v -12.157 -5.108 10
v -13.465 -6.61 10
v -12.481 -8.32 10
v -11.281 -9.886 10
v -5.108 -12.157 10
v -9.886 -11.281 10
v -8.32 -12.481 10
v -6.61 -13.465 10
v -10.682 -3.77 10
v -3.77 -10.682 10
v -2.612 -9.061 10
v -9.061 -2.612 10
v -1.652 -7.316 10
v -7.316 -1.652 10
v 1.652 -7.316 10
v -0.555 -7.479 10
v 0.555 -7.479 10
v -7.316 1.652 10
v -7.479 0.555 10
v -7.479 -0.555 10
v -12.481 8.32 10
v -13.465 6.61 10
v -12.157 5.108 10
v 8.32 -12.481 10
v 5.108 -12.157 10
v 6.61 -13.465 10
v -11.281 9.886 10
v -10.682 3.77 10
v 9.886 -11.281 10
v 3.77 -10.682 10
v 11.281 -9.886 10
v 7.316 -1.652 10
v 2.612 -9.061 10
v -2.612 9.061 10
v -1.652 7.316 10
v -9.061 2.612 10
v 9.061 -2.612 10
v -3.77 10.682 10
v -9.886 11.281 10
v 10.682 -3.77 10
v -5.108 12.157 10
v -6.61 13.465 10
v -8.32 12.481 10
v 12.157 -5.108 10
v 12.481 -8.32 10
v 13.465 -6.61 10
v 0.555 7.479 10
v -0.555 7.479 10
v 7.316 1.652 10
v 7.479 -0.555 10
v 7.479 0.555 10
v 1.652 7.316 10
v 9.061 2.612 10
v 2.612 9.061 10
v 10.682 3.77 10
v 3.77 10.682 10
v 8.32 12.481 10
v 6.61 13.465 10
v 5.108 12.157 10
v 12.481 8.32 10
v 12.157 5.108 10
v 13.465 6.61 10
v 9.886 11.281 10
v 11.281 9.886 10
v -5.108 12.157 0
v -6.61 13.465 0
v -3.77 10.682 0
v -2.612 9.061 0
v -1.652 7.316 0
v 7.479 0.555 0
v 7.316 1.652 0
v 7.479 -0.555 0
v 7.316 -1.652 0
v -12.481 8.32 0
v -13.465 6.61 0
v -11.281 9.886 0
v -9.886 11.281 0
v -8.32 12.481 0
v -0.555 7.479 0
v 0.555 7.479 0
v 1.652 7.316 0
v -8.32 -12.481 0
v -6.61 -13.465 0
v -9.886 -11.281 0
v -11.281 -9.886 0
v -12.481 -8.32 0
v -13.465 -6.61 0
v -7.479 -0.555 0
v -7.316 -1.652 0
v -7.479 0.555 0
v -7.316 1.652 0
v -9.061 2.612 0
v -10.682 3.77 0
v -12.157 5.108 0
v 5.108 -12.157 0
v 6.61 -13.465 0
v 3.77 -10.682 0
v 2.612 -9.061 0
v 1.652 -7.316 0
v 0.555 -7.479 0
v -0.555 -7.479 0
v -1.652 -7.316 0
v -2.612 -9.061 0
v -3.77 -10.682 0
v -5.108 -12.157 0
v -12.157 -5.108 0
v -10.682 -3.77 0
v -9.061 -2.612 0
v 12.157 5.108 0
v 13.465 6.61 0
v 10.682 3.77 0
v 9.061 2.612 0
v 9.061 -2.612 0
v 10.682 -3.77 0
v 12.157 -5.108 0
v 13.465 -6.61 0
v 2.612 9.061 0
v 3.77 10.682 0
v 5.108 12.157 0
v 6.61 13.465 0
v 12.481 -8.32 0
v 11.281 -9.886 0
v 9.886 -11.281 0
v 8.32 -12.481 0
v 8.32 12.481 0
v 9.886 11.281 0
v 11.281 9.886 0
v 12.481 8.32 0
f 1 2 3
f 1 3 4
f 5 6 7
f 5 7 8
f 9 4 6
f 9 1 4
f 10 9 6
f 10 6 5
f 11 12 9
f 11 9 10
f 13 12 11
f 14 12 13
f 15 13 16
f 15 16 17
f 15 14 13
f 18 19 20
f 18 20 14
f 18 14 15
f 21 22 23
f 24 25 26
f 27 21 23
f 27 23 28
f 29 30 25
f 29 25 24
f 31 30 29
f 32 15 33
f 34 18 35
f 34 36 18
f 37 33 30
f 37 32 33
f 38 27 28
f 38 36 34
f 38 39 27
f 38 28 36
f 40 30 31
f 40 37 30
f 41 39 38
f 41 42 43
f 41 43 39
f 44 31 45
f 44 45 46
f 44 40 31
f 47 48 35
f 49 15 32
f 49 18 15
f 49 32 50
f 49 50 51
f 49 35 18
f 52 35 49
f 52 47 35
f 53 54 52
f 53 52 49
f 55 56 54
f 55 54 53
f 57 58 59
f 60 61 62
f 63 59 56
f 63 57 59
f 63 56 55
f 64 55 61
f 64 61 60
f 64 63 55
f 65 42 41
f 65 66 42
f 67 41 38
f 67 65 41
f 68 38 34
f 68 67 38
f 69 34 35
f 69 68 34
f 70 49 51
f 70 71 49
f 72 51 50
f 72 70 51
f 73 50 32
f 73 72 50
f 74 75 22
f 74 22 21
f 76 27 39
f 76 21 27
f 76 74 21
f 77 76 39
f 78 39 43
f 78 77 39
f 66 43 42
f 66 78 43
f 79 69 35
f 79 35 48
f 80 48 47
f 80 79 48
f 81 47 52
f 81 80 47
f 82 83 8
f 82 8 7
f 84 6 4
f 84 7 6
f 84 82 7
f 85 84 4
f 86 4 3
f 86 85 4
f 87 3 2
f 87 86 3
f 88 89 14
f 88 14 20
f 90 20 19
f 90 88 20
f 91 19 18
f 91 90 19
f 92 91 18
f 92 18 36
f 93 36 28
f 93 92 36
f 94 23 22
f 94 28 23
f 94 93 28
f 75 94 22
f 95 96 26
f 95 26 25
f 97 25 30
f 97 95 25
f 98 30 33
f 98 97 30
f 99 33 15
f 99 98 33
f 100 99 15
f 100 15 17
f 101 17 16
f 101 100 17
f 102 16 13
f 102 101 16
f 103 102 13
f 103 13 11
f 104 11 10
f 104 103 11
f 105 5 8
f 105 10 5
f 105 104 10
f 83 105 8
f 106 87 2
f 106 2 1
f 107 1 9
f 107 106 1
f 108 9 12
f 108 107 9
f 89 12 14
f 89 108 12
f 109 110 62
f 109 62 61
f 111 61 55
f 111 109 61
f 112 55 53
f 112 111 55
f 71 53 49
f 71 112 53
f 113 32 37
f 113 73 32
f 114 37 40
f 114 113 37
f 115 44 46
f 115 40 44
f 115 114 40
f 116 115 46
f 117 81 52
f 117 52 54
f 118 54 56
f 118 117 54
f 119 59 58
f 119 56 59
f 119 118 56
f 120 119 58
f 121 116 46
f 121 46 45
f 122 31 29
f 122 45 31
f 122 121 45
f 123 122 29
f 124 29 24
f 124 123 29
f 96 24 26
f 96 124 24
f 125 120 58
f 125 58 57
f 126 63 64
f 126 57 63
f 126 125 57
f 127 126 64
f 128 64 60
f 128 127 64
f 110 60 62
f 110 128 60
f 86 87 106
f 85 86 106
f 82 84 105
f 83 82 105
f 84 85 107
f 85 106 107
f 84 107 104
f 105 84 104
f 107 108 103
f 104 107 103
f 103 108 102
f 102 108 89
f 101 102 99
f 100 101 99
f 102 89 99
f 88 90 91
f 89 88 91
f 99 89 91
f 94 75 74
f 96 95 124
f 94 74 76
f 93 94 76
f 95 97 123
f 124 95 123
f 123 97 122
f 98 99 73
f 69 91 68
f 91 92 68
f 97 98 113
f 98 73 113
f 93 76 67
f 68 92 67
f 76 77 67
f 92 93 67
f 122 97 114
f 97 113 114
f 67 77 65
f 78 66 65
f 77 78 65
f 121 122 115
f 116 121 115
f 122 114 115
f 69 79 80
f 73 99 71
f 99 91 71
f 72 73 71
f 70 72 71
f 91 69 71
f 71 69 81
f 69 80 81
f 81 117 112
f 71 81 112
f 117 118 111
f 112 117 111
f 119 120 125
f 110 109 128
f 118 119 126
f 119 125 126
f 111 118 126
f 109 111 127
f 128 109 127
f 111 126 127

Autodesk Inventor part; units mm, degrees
sketch "Sketch_1" plane through (0, 0, 0) normal (0, 0, 1) x (1, 0, 0)
  arc A0 (-13.4651, -6.61) -> (-6.61, -13.4651) centre (0, 0) ccw
  arc A1 (-6.61, -13.4651) -> (-1.6525, -7.3157) centre (-17.0197, 0) ccw
  arc A2 (-1.6525, -7.3157) -> (1.6525, -7.3157) centre (0, 0) ccw
  arc A3 (1.6525, -7.3157) -> (6.61, -13.4651) centre (17.0197, 0) ccw
  arc A4 (6.61, -13.4651) -> (13.4651, -6.61) centre (0, 0) ccw
  arc A5 (13.4651, -6.61) -> (7.3157, -1.6525) centre (0, -17.0197) ccw
  arc A6 (7.3157, -1.6525) -> (7.3157, 1.6525) centre (0, 0) ccw
  arc A7 (7.3157, 1.6525) -> (13.4651, 6.61) centre (0, 17.0197) ccw
  arc A8 (13.4651, 6.61) -> (6.61, 13.4651) centre (0, 0) ccw
  arc A9 (6.61, 13.4651) -> (1.6525, 7.3157) centre (17.0197, 0) ccw
  arc A10 (1.6525, 7.3157) -> (-1.6525, 7.3157) centre (0, 0) ccw
  arc A11 (-1.6525, 7.3157) -> (-6.61, 13.4651) centre (-17.0197, 0) ccw
  arc A12 (-6.61, 13.4651) -> (-13.4651, 6.61) centre (0, 0) ccw
  arc A13 (-13.4651, 6.61) -> (-7.3157, 1.6525) centre (0, 17.0197) ccw
  arc A14 (-7.3157, 1.6525) -> (-7.3157, -1.6525) centre (0, 0) ccw
  arc A15 (-7.3157, -1.6525) -> (-13.4651, -6.61) centre (0, -17.0197) ccw
extrude "Extrusion1" add sketch "Sketch_1" along normal blind 10
ref_plane "part2a_XY" through (0, 0, 0) normal (0, 0, 1) x (1, 0, 0)
ref_plane "part2a_YZ" through (0, 0, 0) normal (1, 0, 0) x (0, 1, 0)
ref_plane "part2a_ZX" through (0, 0, 0) normal (0, 1, 0) x (0, 0, 1)
properties part number "MJT-30-BL Sleeve"
